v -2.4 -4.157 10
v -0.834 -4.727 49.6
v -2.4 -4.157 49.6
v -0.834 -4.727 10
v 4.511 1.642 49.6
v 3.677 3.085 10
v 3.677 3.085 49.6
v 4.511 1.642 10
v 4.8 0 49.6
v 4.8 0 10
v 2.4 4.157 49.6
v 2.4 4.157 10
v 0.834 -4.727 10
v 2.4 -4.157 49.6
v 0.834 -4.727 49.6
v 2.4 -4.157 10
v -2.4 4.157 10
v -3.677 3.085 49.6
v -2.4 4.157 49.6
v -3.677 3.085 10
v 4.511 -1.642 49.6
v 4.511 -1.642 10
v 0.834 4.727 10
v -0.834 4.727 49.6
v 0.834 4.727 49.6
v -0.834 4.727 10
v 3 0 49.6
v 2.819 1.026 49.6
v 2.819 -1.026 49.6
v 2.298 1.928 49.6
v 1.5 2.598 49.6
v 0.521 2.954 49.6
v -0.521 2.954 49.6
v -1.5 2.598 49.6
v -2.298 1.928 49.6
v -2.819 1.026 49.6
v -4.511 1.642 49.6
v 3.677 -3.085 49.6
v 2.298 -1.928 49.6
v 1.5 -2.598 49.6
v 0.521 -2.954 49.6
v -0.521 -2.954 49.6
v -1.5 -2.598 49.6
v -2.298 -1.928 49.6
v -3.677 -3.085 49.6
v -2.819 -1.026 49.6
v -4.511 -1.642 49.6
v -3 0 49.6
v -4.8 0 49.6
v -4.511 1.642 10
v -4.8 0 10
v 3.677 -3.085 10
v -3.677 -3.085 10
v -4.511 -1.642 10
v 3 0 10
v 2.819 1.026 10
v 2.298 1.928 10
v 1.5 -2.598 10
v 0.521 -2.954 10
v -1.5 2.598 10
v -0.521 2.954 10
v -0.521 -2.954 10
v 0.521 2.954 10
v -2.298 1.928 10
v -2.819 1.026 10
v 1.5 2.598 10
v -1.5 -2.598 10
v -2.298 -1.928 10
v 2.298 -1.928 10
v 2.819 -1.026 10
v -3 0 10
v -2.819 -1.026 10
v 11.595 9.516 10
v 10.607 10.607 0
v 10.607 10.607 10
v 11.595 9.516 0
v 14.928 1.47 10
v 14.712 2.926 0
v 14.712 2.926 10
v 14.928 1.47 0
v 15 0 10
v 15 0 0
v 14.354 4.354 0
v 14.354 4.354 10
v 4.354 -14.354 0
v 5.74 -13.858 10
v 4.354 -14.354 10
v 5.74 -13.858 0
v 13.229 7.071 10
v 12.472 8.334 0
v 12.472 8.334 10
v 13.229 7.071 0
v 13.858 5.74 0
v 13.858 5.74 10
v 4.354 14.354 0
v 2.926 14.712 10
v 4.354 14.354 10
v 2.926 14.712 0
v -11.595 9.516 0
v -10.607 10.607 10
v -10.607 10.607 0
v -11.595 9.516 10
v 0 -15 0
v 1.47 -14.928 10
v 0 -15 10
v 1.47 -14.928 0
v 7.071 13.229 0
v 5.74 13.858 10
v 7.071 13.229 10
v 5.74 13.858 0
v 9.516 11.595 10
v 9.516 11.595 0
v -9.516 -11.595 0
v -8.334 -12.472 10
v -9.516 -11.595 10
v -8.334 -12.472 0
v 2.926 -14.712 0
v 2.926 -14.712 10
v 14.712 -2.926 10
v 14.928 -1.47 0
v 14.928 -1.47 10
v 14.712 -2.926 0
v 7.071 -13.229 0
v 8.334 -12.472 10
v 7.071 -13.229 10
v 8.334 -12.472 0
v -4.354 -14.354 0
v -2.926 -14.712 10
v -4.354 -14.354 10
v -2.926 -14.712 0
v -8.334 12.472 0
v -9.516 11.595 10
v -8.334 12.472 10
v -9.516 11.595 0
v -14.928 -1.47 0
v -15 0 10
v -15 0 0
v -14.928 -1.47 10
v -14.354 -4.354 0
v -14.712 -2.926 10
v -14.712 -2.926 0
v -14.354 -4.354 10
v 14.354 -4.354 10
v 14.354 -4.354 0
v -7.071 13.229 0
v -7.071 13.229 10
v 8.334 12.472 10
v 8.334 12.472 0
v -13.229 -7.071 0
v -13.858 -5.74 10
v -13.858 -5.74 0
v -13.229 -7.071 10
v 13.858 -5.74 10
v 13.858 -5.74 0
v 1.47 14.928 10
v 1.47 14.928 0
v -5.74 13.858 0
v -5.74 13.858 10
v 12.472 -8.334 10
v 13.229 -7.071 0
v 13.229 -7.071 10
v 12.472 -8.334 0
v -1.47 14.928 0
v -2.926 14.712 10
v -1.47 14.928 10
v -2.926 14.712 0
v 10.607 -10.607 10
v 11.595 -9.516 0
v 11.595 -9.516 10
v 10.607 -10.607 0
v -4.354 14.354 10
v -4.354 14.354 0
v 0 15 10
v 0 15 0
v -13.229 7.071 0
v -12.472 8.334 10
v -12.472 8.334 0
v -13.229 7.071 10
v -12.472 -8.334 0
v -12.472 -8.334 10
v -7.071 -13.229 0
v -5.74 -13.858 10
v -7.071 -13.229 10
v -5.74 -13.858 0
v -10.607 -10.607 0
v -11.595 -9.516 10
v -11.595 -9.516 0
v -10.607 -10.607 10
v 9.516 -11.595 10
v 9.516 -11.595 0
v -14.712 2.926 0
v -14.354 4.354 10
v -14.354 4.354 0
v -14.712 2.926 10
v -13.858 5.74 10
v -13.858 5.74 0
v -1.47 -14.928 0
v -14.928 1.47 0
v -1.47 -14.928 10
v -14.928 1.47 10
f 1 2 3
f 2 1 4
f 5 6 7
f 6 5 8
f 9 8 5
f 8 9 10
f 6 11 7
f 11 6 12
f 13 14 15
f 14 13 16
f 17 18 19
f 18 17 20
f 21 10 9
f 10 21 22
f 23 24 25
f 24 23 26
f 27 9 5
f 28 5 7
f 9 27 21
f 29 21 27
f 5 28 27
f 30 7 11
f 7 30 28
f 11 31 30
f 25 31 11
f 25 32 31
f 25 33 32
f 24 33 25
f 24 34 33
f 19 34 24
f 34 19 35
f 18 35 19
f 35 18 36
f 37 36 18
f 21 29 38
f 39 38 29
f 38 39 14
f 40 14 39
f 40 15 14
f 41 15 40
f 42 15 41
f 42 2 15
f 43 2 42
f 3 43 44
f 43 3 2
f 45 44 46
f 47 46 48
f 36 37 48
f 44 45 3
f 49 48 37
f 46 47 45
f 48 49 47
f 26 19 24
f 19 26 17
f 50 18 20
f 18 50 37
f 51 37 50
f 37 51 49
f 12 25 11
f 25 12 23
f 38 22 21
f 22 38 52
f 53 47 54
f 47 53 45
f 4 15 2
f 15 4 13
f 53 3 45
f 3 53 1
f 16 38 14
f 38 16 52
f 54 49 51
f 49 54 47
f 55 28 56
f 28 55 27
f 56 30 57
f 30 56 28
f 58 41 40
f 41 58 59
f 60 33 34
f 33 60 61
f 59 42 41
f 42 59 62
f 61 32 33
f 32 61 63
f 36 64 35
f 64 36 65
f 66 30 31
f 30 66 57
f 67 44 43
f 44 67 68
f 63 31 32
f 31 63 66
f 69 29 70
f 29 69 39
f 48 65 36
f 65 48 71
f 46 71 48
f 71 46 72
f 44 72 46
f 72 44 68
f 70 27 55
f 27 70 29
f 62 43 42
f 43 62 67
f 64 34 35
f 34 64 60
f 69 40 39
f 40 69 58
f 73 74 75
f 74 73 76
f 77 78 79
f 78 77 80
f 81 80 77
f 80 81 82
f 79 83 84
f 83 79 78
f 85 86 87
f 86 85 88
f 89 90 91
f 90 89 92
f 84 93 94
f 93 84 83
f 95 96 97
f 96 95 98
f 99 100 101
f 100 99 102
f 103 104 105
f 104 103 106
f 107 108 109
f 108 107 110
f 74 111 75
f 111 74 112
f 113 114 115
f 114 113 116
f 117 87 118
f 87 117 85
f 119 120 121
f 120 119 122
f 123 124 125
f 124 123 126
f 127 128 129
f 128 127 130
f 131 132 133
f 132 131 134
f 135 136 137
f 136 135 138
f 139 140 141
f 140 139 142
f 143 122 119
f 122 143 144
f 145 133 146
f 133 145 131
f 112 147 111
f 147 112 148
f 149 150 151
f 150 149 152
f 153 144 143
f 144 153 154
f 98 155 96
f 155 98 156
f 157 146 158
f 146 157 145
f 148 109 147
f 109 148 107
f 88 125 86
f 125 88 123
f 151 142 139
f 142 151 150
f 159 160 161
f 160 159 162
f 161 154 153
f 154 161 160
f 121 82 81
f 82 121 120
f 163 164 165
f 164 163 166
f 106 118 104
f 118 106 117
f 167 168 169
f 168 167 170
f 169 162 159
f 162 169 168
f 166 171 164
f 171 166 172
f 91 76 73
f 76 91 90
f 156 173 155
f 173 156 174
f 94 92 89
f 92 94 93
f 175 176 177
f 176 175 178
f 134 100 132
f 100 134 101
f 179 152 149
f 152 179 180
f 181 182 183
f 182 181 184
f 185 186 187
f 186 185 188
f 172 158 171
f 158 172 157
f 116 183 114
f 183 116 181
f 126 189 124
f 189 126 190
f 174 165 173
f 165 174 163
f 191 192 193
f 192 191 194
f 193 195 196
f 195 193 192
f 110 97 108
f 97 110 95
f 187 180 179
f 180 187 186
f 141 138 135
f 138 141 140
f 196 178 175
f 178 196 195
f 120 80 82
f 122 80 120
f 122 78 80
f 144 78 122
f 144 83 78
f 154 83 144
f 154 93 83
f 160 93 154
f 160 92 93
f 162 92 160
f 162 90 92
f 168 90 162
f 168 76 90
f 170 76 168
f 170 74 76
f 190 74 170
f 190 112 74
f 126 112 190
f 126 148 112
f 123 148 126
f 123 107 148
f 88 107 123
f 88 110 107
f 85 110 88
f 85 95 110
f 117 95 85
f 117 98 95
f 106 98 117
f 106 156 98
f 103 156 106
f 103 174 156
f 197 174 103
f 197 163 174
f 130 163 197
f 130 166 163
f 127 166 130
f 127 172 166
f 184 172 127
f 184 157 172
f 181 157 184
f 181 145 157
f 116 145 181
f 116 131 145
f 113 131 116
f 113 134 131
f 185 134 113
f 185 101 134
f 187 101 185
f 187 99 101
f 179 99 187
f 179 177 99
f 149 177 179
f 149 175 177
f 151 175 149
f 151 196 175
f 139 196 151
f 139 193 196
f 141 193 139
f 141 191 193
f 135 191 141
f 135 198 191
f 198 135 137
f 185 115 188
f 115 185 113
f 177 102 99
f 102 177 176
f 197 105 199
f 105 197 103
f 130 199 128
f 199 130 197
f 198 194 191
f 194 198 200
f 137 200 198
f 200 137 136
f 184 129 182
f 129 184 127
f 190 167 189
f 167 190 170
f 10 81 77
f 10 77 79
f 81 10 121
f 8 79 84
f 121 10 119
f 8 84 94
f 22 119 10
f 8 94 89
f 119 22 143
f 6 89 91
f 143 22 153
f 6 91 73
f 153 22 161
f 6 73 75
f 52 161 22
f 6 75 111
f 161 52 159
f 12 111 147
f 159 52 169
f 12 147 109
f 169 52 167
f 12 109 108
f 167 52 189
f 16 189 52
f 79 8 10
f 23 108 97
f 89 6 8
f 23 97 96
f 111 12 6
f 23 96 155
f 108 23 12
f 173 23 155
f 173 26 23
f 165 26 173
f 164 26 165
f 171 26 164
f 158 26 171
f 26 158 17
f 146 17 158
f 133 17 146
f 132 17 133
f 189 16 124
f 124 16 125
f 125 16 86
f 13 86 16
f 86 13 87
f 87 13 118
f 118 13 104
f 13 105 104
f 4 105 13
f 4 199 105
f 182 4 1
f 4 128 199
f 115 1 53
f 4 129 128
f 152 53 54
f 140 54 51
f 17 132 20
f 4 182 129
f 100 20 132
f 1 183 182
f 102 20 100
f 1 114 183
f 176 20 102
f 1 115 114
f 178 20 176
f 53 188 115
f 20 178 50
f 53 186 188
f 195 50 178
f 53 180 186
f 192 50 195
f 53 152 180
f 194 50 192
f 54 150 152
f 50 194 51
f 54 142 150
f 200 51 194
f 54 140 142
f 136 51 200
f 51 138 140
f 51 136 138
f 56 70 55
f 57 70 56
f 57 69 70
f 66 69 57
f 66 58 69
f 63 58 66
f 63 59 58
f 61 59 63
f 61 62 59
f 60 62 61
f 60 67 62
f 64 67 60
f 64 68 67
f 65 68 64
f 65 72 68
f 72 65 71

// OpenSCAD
$fn = 64;
cylinder($fn=64, d=30, h=10);

$fn = 18;
translate([0,0,9.6]) difference() {
    cylinder(d=9.6, h=40);
    cylinder(d=6, h=50);
}
